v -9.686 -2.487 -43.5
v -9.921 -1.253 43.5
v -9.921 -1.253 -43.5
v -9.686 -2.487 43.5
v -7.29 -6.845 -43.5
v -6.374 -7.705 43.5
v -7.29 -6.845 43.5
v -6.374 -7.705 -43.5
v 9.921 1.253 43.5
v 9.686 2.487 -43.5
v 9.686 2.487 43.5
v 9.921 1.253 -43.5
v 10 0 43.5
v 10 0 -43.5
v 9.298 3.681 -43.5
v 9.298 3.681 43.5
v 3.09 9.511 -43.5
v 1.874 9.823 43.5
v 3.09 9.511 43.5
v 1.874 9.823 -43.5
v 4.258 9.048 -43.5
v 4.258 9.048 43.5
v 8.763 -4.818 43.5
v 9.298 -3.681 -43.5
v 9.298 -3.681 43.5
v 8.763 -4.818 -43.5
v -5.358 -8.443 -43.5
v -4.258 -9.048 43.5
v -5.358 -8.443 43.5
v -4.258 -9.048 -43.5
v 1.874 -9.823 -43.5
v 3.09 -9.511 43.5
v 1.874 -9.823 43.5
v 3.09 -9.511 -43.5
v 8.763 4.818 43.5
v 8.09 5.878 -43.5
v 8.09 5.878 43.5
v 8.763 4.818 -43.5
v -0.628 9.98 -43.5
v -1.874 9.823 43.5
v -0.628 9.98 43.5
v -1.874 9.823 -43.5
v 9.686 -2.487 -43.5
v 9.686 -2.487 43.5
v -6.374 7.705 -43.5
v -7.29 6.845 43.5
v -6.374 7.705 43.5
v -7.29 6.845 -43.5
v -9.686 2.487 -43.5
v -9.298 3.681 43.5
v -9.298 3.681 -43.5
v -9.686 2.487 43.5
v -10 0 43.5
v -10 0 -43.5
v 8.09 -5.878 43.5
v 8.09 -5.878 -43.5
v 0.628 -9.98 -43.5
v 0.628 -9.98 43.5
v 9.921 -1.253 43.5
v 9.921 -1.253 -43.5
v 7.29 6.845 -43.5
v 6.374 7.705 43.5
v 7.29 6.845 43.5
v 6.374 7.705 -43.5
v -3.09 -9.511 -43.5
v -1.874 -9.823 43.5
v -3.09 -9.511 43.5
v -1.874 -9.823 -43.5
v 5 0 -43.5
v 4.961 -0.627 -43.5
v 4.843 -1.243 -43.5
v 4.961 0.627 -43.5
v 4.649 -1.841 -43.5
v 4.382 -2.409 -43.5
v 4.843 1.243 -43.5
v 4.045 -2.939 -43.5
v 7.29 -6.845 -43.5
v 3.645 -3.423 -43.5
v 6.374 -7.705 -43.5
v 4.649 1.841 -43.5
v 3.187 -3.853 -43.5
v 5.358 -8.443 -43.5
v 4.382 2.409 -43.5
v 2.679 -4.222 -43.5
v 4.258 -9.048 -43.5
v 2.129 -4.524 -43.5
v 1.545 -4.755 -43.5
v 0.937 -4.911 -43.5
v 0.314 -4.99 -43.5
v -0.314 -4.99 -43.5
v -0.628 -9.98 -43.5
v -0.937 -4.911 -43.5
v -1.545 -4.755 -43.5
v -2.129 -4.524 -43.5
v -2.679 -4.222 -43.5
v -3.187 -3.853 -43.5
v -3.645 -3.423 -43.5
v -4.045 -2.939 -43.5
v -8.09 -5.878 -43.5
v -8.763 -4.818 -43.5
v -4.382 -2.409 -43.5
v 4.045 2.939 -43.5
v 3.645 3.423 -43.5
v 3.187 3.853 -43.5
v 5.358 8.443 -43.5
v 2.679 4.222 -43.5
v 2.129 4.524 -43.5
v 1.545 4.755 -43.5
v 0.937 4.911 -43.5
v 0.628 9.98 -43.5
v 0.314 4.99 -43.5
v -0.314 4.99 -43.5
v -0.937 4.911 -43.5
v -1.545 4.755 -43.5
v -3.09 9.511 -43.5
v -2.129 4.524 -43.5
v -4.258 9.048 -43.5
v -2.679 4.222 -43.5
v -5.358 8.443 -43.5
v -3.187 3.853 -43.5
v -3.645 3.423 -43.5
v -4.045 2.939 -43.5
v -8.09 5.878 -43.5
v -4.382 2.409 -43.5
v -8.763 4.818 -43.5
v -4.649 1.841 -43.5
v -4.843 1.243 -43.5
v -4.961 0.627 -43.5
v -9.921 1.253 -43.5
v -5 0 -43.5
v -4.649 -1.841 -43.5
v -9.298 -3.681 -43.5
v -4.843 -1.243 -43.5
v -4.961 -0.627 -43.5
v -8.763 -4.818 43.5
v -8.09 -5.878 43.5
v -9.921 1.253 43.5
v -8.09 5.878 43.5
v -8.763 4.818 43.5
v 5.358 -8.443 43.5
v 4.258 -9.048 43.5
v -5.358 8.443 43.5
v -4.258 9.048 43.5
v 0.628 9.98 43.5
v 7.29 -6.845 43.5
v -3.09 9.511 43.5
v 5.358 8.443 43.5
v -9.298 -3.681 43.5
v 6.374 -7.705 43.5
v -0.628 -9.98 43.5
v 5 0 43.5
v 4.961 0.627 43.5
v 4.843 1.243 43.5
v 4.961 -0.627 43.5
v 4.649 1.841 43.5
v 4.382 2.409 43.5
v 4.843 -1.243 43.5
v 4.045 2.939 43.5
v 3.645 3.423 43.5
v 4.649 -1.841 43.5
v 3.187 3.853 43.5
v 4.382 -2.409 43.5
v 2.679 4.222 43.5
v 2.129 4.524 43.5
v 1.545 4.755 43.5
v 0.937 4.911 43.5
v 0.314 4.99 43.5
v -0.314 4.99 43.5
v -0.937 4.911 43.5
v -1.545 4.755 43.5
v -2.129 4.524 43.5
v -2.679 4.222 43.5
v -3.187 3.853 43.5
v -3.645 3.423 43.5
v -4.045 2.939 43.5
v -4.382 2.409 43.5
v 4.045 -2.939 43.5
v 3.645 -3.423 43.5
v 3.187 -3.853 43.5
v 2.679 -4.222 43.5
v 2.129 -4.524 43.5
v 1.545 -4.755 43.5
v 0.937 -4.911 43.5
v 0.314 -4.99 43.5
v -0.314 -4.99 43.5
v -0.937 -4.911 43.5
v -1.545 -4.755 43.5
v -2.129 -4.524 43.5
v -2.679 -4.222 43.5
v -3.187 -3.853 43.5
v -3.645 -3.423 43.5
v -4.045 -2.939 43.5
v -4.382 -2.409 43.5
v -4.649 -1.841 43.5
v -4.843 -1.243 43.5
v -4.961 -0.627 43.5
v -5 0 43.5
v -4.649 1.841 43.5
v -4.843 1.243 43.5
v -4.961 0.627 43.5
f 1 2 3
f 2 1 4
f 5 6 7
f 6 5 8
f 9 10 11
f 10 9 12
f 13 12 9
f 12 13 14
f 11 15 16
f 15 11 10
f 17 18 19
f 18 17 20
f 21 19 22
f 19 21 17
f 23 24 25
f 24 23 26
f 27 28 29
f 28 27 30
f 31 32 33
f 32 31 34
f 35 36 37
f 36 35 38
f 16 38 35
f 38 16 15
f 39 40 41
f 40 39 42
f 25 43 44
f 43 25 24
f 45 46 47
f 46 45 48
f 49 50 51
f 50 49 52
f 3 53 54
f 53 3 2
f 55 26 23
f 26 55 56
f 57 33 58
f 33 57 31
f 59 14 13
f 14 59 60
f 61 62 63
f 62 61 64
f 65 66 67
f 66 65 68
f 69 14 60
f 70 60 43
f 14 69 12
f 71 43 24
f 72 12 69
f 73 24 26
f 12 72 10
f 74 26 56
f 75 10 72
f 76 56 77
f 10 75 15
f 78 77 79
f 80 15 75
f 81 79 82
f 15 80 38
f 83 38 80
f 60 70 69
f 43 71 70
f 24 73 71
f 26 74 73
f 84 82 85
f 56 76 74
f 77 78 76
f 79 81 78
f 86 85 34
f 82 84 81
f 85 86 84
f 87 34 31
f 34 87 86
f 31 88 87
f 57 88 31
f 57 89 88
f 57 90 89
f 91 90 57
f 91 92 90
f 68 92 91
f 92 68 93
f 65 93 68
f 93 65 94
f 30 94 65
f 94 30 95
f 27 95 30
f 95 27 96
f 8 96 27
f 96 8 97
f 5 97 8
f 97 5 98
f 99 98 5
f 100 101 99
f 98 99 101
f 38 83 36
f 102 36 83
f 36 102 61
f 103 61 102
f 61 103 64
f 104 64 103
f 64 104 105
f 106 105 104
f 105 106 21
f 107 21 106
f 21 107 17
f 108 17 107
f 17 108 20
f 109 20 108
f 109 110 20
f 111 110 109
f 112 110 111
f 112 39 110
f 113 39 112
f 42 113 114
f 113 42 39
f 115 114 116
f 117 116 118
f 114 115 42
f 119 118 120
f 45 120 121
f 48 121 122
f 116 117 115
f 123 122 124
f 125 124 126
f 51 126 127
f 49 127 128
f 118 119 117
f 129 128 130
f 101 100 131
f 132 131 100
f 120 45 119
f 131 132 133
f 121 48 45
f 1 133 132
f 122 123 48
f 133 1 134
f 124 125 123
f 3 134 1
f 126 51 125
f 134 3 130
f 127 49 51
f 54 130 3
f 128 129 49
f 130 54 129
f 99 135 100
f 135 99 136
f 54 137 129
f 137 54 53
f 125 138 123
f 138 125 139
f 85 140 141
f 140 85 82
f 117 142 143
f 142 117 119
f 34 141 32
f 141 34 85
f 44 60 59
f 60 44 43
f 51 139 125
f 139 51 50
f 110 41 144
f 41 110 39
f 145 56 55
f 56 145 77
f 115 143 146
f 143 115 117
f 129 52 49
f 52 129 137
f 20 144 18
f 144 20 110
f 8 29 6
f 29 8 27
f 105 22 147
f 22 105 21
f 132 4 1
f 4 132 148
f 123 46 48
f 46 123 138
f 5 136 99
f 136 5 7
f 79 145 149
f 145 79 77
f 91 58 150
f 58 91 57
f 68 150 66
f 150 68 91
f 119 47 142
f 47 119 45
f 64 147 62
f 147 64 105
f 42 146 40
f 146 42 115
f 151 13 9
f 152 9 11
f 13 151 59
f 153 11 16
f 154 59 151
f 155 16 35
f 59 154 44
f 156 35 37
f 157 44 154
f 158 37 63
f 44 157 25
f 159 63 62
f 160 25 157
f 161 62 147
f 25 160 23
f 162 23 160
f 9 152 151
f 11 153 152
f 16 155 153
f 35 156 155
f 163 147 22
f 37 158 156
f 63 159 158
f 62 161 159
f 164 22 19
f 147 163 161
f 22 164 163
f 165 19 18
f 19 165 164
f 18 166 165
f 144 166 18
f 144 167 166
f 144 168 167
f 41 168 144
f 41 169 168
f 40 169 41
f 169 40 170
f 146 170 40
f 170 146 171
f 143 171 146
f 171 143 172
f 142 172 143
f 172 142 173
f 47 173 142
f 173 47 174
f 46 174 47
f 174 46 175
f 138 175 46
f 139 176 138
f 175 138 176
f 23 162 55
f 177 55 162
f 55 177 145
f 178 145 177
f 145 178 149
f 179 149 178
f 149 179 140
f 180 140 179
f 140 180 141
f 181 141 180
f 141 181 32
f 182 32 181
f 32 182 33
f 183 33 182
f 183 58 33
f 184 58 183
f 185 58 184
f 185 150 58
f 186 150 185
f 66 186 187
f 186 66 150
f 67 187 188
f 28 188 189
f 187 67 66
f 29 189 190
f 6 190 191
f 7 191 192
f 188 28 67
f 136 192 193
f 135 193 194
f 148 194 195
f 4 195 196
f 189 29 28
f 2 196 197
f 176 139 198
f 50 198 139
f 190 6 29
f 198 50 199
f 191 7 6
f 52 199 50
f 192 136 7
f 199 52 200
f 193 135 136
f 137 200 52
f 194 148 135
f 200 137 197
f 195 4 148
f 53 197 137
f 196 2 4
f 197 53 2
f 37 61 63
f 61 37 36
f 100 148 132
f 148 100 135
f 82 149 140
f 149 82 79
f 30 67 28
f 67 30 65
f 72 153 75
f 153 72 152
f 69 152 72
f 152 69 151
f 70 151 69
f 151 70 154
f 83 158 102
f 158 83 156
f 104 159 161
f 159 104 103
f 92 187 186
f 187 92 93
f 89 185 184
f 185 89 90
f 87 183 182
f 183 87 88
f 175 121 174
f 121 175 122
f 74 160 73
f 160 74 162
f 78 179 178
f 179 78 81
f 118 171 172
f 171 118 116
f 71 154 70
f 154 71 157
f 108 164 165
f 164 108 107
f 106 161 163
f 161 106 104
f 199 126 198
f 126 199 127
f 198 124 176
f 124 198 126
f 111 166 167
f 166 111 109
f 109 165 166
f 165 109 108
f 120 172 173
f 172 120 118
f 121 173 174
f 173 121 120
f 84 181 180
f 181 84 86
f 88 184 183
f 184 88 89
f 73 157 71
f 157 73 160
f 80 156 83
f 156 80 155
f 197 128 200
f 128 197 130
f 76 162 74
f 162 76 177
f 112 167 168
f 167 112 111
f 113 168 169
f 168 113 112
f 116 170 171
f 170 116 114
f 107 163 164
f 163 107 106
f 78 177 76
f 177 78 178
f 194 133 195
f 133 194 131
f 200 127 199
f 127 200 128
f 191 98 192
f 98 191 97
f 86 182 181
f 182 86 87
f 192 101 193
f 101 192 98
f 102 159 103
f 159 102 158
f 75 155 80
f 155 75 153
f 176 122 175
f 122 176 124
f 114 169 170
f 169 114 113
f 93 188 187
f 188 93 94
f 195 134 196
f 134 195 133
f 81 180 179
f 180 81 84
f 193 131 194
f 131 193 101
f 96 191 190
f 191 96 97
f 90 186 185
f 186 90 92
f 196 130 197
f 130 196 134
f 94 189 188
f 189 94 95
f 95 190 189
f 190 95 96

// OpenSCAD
$fn = 50;


difference() {
	union() {
		translate(v = [0, 0, -43.5000000000]) {
			cylinder(h = 87, r = 10.0000000000);
		}
	}
	union() {
		translate(v = [0, 0, -100.0000000000]) {
			cylinder(h = 200, r = 5.0000000000);
		}
	}
}
